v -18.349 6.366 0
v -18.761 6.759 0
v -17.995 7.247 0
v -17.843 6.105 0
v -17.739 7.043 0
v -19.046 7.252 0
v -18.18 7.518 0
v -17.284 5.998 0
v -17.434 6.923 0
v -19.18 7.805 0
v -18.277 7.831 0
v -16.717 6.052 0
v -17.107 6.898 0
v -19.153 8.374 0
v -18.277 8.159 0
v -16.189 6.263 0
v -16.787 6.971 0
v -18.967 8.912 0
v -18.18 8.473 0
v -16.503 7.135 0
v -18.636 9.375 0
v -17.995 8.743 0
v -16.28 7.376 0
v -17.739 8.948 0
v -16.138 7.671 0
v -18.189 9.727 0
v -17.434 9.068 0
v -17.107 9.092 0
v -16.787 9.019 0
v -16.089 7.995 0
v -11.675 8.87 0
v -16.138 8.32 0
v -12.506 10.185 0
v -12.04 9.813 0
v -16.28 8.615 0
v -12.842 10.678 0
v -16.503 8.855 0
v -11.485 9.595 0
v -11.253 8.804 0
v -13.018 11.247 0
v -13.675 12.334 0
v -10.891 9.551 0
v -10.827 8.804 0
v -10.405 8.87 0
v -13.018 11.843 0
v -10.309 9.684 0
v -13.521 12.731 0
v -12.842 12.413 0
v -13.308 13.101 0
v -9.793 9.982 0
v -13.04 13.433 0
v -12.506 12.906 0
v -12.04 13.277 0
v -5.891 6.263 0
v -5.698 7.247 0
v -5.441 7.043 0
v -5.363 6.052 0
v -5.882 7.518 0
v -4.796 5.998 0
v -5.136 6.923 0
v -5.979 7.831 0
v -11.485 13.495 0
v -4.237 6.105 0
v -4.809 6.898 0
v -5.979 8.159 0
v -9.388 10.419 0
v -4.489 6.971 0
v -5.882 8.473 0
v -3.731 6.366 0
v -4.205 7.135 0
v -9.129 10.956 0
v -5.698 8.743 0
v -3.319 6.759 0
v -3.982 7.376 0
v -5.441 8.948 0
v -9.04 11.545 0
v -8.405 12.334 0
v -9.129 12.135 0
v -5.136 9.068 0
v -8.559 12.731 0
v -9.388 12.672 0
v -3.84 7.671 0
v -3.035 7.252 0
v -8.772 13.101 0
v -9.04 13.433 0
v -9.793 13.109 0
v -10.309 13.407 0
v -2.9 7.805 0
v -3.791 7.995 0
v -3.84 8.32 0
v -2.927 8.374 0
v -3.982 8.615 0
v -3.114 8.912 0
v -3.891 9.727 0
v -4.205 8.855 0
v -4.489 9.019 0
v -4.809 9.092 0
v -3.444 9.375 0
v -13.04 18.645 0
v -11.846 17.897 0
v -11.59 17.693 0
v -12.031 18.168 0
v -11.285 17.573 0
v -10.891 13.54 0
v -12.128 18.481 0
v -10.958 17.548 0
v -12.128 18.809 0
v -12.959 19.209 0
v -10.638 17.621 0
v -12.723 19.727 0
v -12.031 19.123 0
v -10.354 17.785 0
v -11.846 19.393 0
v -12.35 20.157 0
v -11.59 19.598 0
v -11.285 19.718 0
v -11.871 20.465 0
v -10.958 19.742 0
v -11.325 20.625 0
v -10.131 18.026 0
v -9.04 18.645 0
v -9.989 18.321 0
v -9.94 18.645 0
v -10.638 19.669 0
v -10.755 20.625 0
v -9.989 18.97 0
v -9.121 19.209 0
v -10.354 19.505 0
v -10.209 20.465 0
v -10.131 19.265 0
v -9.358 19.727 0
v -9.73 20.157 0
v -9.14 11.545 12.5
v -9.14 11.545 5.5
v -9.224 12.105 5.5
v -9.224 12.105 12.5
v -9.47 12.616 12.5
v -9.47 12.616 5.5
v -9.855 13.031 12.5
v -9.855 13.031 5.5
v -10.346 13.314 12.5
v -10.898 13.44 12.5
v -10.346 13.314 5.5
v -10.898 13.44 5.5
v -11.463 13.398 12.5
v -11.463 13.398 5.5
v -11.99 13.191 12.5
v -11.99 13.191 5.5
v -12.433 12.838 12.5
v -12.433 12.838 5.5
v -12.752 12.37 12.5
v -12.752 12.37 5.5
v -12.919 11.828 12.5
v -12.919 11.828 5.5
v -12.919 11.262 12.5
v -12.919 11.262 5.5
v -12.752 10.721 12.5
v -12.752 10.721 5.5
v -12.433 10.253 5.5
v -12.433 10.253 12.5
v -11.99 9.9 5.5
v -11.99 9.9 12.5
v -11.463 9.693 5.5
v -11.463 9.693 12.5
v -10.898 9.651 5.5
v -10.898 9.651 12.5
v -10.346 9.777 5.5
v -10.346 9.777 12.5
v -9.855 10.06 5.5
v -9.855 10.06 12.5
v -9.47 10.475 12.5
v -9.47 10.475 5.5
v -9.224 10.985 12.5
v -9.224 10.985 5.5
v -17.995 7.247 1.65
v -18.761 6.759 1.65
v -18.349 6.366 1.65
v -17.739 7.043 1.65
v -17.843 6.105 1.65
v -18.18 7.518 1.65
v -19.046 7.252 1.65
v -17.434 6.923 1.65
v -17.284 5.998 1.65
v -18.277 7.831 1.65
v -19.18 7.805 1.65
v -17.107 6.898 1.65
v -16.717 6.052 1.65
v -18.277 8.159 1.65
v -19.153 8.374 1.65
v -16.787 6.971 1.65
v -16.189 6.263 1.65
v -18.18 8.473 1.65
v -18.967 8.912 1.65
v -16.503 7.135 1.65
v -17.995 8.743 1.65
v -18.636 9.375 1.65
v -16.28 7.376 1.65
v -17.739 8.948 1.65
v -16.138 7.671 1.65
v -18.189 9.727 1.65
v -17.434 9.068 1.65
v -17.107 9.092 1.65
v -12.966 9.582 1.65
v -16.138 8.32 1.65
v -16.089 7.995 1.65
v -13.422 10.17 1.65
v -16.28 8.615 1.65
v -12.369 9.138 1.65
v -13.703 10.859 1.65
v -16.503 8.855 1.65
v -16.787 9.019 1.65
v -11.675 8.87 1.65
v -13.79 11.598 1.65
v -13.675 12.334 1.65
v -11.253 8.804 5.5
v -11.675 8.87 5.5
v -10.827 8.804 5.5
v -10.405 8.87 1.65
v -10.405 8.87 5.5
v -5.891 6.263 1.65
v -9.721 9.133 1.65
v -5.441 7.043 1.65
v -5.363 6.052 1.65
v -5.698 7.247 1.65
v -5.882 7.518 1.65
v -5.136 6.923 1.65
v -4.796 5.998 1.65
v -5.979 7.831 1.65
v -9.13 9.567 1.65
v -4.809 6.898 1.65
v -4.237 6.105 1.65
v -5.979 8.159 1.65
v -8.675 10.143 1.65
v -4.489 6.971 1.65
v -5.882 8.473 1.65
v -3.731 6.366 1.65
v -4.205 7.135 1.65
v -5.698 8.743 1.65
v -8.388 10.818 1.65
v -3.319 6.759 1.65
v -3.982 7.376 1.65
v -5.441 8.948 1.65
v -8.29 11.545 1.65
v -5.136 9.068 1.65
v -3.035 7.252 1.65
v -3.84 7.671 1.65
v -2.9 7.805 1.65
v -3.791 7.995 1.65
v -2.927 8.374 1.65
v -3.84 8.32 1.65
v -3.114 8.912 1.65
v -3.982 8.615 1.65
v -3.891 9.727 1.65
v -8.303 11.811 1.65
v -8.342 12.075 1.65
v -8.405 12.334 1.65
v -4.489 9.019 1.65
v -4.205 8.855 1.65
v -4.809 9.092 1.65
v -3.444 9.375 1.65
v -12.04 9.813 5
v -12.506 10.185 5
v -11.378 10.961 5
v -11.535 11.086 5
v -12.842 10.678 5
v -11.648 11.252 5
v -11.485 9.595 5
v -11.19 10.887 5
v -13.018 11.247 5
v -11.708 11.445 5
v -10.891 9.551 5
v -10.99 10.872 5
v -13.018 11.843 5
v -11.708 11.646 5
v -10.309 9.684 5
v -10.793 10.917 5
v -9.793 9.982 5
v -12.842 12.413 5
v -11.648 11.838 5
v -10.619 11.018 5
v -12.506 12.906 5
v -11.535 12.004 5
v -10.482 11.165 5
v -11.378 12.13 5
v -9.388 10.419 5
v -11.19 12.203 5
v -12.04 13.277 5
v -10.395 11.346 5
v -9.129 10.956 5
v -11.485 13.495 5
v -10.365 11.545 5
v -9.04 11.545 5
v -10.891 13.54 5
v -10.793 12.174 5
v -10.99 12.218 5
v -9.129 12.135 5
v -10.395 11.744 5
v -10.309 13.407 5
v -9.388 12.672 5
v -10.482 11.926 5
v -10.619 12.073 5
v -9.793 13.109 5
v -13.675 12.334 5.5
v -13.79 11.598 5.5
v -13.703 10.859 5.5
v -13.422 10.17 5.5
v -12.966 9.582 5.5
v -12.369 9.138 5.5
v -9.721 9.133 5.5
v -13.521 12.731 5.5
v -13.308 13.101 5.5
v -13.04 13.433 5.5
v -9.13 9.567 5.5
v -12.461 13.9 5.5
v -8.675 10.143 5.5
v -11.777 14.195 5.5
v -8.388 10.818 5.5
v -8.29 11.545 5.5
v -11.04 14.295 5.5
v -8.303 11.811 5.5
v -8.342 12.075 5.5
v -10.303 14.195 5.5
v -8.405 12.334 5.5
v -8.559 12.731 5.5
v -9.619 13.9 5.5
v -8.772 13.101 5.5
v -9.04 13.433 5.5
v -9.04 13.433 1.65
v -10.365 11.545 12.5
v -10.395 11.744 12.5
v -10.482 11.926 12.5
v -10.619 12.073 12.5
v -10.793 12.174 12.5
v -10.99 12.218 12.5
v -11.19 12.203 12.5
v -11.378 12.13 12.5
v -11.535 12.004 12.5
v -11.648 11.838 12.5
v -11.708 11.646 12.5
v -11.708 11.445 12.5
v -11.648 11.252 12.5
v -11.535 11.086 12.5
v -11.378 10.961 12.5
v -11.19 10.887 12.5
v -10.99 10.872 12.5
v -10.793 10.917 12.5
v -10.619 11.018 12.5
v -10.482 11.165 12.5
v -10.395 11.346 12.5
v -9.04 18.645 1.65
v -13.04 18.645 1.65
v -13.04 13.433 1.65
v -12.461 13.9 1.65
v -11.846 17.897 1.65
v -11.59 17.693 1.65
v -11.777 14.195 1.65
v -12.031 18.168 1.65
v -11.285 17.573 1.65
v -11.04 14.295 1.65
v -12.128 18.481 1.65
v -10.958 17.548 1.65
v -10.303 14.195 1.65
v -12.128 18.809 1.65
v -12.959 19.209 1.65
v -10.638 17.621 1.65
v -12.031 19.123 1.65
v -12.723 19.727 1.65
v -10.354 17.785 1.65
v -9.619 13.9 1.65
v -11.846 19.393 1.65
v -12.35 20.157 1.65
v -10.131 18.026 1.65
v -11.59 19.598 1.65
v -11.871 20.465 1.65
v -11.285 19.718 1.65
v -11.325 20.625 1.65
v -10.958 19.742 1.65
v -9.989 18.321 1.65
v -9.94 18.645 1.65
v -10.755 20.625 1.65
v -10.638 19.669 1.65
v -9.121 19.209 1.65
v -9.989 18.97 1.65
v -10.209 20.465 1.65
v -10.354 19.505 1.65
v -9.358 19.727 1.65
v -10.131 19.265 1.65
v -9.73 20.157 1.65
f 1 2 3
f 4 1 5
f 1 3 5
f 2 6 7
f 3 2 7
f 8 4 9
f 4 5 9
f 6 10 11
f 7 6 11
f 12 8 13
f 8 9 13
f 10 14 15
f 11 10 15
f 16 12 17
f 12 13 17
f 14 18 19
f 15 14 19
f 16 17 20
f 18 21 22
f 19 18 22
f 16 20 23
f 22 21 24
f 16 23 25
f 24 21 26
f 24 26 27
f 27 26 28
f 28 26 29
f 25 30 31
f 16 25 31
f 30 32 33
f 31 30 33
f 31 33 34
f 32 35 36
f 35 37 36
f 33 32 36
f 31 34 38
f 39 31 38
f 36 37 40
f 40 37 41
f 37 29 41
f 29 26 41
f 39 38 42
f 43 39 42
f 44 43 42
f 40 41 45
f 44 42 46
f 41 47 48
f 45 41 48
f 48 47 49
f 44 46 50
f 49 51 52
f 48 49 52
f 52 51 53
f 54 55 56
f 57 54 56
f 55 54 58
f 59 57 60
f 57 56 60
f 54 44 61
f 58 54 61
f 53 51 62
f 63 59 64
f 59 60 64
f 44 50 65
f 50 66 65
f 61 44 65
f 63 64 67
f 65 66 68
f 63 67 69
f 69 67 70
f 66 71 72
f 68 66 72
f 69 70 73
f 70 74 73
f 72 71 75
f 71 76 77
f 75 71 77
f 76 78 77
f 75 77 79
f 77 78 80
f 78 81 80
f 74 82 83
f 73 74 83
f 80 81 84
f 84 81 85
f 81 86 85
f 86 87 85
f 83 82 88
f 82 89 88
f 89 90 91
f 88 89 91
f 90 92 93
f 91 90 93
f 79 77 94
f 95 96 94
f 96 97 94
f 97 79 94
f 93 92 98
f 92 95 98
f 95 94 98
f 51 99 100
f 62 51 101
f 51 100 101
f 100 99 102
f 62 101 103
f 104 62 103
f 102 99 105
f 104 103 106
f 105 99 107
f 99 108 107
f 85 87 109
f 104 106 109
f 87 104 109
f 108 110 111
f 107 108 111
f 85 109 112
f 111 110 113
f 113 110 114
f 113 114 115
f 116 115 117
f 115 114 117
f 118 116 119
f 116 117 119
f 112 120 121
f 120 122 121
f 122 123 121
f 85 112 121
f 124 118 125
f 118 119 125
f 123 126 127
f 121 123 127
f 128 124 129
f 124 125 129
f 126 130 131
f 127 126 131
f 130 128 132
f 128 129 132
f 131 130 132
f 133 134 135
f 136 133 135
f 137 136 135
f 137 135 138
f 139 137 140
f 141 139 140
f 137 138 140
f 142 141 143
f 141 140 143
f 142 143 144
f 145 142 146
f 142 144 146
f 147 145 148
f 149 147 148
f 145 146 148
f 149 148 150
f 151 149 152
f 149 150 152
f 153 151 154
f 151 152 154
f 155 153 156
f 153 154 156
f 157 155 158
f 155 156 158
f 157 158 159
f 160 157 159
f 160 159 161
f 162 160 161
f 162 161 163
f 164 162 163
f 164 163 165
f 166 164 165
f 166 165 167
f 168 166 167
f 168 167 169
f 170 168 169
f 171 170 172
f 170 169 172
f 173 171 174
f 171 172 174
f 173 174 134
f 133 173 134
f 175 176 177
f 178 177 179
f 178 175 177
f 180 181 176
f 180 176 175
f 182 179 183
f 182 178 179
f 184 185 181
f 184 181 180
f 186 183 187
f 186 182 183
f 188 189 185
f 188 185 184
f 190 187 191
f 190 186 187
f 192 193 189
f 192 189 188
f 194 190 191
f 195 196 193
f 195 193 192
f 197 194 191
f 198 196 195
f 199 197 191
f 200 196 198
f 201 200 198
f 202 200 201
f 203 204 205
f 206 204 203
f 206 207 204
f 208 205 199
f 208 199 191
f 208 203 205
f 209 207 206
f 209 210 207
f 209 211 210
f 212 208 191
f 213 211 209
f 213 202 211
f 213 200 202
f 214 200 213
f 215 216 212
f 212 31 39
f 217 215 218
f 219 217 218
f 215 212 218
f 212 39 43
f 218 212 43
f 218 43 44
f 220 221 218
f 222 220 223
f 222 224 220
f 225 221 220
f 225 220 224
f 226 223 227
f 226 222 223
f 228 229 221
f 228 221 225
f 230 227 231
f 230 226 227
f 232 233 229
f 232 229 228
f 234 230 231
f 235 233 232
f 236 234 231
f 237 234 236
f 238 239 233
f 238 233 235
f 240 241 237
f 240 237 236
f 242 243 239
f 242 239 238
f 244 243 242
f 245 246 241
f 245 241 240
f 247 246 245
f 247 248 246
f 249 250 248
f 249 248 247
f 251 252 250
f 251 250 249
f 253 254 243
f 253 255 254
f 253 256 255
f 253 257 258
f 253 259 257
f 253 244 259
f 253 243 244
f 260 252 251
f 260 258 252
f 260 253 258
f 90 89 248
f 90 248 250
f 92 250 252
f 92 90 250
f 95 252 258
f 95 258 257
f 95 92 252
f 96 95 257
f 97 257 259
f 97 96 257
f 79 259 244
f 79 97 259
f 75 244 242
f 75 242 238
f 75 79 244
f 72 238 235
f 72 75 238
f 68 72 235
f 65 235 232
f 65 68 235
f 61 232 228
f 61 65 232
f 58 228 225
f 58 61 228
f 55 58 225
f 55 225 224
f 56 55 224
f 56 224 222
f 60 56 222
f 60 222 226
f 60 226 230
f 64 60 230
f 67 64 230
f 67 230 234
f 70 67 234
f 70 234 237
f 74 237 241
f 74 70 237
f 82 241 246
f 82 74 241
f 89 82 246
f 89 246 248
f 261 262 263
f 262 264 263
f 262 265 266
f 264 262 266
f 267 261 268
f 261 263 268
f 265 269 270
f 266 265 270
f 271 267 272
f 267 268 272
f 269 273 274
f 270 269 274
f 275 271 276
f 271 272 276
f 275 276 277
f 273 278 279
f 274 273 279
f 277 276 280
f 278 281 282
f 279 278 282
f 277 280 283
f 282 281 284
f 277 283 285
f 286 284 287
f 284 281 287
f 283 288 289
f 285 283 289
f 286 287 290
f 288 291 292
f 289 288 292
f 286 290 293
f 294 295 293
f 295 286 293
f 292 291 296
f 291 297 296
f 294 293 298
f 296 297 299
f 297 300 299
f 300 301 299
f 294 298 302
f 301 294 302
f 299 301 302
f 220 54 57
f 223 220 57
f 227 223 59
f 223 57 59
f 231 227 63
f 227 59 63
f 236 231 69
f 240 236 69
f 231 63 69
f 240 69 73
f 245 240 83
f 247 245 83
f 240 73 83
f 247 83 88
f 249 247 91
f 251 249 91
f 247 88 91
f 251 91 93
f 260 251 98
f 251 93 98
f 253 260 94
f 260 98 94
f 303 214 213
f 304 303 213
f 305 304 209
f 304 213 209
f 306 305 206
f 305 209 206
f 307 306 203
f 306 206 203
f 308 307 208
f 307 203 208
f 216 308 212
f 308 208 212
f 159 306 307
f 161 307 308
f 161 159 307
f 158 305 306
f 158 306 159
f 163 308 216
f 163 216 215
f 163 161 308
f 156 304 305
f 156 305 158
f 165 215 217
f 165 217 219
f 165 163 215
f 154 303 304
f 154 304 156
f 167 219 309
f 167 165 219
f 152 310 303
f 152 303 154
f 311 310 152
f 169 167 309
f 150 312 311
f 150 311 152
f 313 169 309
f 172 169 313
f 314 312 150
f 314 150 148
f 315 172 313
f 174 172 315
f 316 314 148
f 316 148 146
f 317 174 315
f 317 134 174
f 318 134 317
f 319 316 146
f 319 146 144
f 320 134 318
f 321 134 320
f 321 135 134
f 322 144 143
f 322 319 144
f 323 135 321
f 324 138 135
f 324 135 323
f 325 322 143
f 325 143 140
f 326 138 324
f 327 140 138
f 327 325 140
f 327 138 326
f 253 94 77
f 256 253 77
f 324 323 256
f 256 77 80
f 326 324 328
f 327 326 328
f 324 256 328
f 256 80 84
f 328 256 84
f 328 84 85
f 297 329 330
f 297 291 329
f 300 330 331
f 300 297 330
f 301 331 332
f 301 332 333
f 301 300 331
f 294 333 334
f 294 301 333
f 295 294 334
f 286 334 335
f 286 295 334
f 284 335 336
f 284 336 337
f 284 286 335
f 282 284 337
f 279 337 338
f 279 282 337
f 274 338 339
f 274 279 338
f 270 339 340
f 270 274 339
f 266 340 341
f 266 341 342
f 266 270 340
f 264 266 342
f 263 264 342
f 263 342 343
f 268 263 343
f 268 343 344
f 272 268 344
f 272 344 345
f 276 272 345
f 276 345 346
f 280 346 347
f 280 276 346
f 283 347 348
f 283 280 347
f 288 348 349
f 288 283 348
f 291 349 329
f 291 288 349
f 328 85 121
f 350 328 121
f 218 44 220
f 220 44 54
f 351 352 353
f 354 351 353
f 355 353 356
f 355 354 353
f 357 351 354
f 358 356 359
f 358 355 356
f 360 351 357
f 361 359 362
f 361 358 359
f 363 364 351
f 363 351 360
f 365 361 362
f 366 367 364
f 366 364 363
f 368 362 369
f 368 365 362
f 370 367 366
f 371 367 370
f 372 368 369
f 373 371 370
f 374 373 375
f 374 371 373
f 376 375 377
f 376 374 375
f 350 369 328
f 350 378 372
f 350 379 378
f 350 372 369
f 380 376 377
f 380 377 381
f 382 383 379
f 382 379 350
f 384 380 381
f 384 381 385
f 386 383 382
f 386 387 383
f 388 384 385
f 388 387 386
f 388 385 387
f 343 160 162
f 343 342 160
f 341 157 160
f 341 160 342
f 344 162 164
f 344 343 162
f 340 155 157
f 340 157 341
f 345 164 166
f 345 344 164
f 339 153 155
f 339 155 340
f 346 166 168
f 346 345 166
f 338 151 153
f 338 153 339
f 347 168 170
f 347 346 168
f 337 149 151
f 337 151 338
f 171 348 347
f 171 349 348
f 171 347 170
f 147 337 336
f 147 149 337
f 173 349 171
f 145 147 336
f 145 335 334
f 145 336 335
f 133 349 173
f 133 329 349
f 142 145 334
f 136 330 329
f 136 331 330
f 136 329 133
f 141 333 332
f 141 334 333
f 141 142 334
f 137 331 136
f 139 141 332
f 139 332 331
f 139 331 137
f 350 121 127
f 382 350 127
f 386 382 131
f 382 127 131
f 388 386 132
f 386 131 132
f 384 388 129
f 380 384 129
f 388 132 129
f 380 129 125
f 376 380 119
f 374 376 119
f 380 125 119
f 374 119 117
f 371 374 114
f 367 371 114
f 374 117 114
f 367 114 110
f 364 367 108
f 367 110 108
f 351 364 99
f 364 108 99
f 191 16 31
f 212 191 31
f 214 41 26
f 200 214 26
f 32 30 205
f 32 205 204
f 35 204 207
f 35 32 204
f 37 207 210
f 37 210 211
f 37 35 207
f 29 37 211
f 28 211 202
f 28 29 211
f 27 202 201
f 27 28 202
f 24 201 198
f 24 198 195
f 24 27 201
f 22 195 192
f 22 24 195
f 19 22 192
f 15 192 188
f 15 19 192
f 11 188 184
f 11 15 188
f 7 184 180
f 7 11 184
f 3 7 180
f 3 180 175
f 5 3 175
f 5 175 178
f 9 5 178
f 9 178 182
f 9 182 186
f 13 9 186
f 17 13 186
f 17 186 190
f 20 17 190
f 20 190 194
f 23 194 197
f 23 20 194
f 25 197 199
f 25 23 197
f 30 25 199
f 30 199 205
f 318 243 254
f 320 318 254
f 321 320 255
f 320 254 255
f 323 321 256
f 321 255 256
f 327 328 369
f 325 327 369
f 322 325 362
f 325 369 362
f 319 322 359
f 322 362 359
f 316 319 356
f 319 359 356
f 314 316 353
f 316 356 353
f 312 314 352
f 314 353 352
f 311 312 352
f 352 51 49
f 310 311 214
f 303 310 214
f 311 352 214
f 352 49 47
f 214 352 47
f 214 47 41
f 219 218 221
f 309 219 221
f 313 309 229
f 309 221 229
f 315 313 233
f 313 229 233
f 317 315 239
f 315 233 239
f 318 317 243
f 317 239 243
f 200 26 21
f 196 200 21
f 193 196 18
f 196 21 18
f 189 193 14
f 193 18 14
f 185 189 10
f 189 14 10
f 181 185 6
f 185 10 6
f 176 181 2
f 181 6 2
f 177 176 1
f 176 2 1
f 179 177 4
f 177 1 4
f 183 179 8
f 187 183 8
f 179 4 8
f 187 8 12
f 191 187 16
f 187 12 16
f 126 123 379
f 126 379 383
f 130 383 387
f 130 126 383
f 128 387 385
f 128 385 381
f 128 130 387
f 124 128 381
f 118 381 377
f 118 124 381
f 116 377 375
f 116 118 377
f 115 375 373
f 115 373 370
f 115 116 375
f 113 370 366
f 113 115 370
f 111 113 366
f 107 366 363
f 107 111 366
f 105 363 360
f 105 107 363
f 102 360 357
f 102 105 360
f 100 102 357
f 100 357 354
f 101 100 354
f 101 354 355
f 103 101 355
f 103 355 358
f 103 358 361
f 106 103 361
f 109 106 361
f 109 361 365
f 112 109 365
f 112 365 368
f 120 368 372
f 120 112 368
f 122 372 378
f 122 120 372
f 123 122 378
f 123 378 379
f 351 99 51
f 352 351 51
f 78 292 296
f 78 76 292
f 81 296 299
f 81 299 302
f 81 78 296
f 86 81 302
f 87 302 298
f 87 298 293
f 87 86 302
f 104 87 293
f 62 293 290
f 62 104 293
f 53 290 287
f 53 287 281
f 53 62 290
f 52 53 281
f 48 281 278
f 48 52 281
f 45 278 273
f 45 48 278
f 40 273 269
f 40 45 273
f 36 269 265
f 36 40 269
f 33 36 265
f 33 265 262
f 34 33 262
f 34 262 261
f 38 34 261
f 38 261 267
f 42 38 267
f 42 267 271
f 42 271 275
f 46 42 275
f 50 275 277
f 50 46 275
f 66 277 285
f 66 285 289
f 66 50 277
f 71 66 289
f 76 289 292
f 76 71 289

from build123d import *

# Parameters (mm, degrees)
F0_R     = 1.1
F0_R_2   = 2
F1_DEPTH = 1.65
F2_R     = 2
F3_DEPTH = 3.85
F4_R     = 2
F4_R_2   = 1.9
F4_R_3   = 0.675
F5_DEPTH = 0.5
F6_DEPTH = 7


with BuildPart() as f1:
    # F0 (on Top) → F1 (new body)
    with BuildSketch(Plane.XY):
        with BuildLine():
            ThreePointArc((-13.040082, 13.43275), (-11.040082, 14.295292), (-9.040082, 13.43275))
            Line((-9.040082, 13.43275), (-9.040082, 18.645292))
            ThreePointArc((-9.040082, 18.645292), (-11.040082, 20.645292), (-13.040082, 18.645292))
            Line((-13.040082, 18.645292), (-13.040082, 13.43275))
        make_face()
        with Locations((-11.040082, 18.645292)):
            Circle(F0_R, mode=Mode.SUBTRACT)
        with BuildLine():
            Line((-16.188862, 6.263241), (-11.674669, 8.869512))
            ThreePointArc((-11.674669, 8.869512), (-13.421652, 10.170292), (-13.674669, 12.333613))
            Line((-13.674669, 12.333613), (-18.188862, 9.727343))
            ThreePointArc((-18.188862, 9.727343), (-18.920913, 6.995292), (-16.188862, 6.263241))
        make_face()
        with Locations((-17.188862, 7.995292)):
            Circle(F0_R, mode=Mode.SUBTRACT)
        with BuildLine():
            ThreePointArc((-10.405495, 8.869512), (-8.882813, 9.839803), (-8.290082, 11.545292))
            ThreePointArc((-8.290082, 11.545292), (-8.319088, 11.943654), (-8.405495, 12.333613))
            ThreePointArc((-8.405495, 12.333613), (-8.658512, 12.920292), (-9.040082, 13.43275))
            ThreePointArc((-9.040082, 13.43275), (-11.040082, 14.295292), (-13.040082, 13.43275))
            ThreePointArc((-13.040082, 13.43275), (-13.421652, 12.920292), (-13.674669, 12.333613))
            ThreePointArc((-13.674669, 12.333613), (-13.421652, 10.170292), (-11.674669, 8.869512))
            ThreePointArc((-11.674669, 8.869512), (-11.040082, 8.795292), (-10.405495, 8.869512))
        make_face()
        with Locations((-11.040082, 11.545292)):
            Circle(F0_R_2, mode=Mode.SUBTRACT)
        with BuildLine():
            ThreePointArc((-8.405495, 12.333613), (-8.319088, 11.943654), (-8.290082, 11.545292))
            ThreePointArc((-8.290082, 11.545292), (-8.882813, 9.839803), (-10.405495, 8.869512))
            Line((-10.405495, 8.869512), (-5.891302, 6.263241))
            ThreePointArc((-5.891302, 6.263241), (-3.159251, 6.995292), (-3.891302, 9.727343))
            Line((-3.891302, 9.727343), (-8.405495, 12.333613))
        make_face()
        with Locations((-4.891302, 7.995292)):
            Circle(F0_R, mode=Mode.SUBTRACT)
    extrude(amount=F1_DEPTH)

    # F2 (on face) → F3 (join)
    with BuildSketch(Plane.XY.offset(1.65)):
        with BuildLine():
            ThreePointArc((-10.405495, 8.869512), (-8.882813, 9.839803), (-8.290082, 11.545292))
            ThreePointArc((-8.290082, 11.545292), (-8.319088, 11.943654), (-8.405495, 12.333613))
            ThreePointArc((-8.405495, 12.333613), (-8.658512, 12.920292), (-9.040082, 13.43275))
            ThreePointArc((-9.040082, 13.43275), (-11.040082, 14.295292), (-13.040082, 13.43275))
            ThreePointArc((-13.040082, 13.43275), (-13.421652, 12.920292), (-13.674669, 12.333613))
            ThreePointArc((-13.674669, 12.333613), (-13.421652, 10.170292), (-11.674669, 8.869512))
            ThreePointArc((-11.674669, 8.869512), (-11.040082, 8.795292), (-10.405495, 8.869512))
        make_face()
        with Locations((-11.040082, 11.545292)):
            Circle(F2_R, mode=Mode.SUBTRACT)
    extrude(amount=F3_DEPTH)

    # F4 (on face) → F5 (join)
    with BuildSketch(Plane.XY.offset(5.5)):
        with Locations((-11.040082, 11.545292)):
            Circle(F4_R)
        with Locations((-11.040082, 11.545292)):
            Circle(F4_R_2, mode=Mode.SUBTRACT)
        with Locations((-11.040082, 11.545292)):
            Circle(F4_R_2)
        with Locations((-11.040082, 11.545292)):
            Circle(F4_R_3, mode=Mode.SUBTRACT)
    extrude(amount=-F5_DEPTH)

    # F4 (on face) → F6 (join)
    with BuildSketch(Plane.XY.offset(5.5)):
        with Locations((-11.040082, 11.545292)):
            Circle(F4_R_2)
        with Locations((-11.040082, 11.545292)):
            Circle(F4_R_3, mode=Mode.SUBTRACT)
    extrude(amount=F6_DEPTH)


solid = f1.part
